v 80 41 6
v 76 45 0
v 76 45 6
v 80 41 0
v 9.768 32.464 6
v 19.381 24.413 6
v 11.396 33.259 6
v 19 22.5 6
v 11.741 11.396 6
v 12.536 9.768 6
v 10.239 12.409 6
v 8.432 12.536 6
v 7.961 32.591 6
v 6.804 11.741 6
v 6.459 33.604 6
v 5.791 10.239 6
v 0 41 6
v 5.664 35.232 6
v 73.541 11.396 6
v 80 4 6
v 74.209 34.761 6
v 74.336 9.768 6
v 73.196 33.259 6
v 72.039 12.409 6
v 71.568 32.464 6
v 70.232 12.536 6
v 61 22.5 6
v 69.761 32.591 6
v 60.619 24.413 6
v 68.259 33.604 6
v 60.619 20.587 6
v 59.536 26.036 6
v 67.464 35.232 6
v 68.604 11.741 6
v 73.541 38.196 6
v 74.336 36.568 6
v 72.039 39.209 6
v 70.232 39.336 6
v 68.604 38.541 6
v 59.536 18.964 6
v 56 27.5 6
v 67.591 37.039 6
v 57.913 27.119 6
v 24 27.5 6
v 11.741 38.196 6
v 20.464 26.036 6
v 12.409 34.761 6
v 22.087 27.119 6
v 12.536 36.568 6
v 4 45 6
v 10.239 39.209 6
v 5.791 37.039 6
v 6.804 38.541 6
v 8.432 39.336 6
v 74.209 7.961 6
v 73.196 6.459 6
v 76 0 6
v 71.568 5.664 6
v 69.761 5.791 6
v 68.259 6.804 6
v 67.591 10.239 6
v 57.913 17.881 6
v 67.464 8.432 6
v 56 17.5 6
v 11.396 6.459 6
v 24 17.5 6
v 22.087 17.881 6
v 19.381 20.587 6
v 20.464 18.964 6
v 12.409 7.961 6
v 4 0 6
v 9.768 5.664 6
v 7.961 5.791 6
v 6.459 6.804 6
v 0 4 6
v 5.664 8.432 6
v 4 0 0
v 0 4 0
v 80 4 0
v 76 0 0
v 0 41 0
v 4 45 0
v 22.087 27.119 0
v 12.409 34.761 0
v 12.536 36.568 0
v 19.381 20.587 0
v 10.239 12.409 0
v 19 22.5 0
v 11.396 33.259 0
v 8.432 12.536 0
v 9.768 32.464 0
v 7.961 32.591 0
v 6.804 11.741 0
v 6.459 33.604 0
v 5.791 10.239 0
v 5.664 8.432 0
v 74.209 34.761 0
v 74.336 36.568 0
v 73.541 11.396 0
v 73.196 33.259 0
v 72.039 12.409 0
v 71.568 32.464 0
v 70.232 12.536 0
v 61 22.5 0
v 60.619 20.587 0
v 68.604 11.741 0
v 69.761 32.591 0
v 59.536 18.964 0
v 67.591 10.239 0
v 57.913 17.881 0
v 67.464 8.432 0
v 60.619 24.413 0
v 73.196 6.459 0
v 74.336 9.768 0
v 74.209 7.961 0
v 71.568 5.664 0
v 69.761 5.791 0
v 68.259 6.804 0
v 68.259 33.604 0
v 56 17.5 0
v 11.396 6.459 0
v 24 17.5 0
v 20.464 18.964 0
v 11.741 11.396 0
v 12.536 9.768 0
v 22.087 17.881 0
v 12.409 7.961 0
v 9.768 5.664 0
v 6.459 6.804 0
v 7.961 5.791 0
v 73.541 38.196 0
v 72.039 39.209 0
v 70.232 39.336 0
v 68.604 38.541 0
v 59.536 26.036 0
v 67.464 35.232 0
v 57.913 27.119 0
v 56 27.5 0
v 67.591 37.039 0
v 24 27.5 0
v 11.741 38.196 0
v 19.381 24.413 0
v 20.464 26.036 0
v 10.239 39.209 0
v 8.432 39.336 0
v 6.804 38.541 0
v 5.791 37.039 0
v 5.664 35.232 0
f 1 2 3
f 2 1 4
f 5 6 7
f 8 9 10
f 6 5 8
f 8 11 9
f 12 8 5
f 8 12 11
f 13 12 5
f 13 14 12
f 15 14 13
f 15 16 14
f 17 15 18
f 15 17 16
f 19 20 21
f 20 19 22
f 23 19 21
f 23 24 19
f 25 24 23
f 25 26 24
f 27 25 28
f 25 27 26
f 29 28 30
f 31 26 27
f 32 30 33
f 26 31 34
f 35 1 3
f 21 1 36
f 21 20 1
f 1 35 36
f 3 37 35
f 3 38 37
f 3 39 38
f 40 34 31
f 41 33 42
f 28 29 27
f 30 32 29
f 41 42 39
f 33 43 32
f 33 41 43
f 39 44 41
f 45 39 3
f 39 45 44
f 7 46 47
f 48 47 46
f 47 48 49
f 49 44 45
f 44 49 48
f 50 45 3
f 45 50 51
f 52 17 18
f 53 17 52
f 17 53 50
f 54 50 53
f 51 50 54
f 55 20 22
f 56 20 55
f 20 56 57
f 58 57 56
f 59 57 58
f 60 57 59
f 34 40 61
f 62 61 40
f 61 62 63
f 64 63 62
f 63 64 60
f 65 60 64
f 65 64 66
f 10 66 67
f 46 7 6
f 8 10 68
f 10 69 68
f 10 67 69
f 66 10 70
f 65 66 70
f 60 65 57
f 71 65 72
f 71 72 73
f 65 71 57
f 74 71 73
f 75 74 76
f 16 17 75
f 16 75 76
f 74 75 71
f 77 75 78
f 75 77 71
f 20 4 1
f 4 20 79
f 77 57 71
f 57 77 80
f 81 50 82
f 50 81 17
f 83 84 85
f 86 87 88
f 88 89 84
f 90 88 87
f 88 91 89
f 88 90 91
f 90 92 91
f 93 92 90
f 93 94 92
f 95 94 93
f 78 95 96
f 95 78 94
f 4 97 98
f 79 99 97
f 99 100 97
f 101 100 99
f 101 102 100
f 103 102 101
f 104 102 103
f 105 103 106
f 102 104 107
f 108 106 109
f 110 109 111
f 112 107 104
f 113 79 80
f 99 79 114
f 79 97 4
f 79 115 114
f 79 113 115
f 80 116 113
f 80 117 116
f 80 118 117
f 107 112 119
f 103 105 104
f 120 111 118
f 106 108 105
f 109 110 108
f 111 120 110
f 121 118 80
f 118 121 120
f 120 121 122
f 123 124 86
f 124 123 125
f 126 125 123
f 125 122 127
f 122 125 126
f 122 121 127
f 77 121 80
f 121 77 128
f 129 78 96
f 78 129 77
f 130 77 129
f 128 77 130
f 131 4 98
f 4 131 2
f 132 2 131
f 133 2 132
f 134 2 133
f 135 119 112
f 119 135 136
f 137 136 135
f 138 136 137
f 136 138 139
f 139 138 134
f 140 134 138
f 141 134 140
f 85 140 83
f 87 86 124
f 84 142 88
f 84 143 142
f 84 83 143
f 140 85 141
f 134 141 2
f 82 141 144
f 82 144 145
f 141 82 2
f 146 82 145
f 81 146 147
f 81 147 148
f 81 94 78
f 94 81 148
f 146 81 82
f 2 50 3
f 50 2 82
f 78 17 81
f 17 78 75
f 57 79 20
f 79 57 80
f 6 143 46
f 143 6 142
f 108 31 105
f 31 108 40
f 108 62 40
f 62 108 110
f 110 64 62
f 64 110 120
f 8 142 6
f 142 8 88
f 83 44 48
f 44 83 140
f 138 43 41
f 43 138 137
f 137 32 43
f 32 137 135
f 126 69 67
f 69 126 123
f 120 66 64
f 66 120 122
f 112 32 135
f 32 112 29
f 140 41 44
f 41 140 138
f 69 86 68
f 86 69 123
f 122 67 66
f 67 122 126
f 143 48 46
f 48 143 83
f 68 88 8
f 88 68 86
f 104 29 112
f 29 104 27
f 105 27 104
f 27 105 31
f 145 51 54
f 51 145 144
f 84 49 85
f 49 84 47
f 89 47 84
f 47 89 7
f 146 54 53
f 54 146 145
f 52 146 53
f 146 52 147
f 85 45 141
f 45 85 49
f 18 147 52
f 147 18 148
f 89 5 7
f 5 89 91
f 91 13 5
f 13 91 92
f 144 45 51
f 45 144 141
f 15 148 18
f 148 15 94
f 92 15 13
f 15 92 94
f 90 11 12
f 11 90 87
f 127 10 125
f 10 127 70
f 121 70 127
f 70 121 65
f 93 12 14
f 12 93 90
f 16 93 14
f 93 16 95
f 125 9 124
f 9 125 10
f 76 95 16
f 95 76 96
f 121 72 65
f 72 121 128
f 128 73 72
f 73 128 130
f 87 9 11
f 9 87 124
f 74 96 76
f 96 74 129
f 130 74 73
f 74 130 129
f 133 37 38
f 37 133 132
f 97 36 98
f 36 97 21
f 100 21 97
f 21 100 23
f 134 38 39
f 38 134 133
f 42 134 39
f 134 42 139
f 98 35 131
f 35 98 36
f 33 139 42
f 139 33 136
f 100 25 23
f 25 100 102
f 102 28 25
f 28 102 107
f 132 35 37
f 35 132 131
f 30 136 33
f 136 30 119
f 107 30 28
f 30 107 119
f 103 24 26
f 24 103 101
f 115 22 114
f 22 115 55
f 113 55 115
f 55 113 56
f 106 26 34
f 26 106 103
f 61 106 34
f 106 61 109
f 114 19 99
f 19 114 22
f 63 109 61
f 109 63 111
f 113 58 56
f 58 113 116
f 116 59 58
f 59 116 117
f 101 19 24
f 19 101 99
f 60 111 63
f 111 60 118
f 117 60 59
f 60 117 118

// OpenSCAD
$fn = 32;

// ----------------------------------------------------------------------
// Bracket plate: slot plate 80 x 45
// ----------------------------------------------------------------------

// --- parameters (mm) ---
hole_r = 3.5;             // bolt hole radius
plate_t = 6;              // plate thickness, Z (extrusion height)
plate_l = 80;             // plate length
plate_w = 45;             // plate width
slot_l = 32;              // slot straight length
slot_r = 5;               // slot end radius

slot_len = slot_l + 2 * slot_r;
slot_w = 2 * slot_r;
hole_d2 = 2 * hole_r;

profile = [[4, 0], [76, 0], [80, 4], [80, 41], [76, 45], [4, 45], [0, 41], [0, 4]];  // primary outline, 8 points, counter clockwise
void_1 = [[56, 17.5], [57.913, 17.881], [59.536, 18.964], [60.619, 20.587], [61, 22.5], [60.619, 24.413], [59.536, 26.036], [57.913, 27.119], [56, 27.5], [24, 27.5], [22.087, 27.119], [20.464, 26.036], [19.381, 24.413], [19, 22.5], [19.381, 20.587], [20.464, 18.964], [22.087, 17.881], [24, 17.5]];  // grip slot, 18 points
void_2 = [[12.536, 36.568], [11.741, 38.196], [10.239, 39.209], [8.432, 39.336], [6.804, 38.541], [5.791, 37.039], [5.664, 35.232], [6.459, 33.604], [7.961, 32.591], [9.768, 32.464], [11.396, 33.259], [12.409, 34.761]];  // corner hole, 12 points
void_3 = [[12.536, 9.768], [11.741, 11.396], [10.239, 12.409], [8.432, 12.536], [6.804, 11.741], [5.791, 10.239], [5.664, 8.432], [6.459, 6.804], [7.961, 5.791], [9.768, 5.664], [11.396, 6.459], [12.409, 7.961]];  // corner hole, 12 points
void_4 = [[74.336, 36.568], [73.541, 38.196], [72.039, 39.209], [70.232, 39.336], [68.604, 38.541], [67.591, 37.039], [67.464, 35.232], [68.259, 33.604], [69.761, 32.591], [71.568, 32.464], [73.196, 33.259], [74.209, 34.761]];  // corner hole, 12 points
void_5 = [[74.336, 9.768], [73.541, 11.396], [72.039, 12.409], [70.232, 12.536], [68.604, 11.741], [67.591, 10.239], [67.464, 8.432], [68.259, 6.804], [69.761, 5.791], [71.568, 5.664], [73.196, 6.459], [74.209, 7.961]];  // corner hole, 12 points

// --- the one profile operation ---
difference() {
  linear_extrude(height = plate_t) polygon(points = profile);
  translate([0, 0, -1])
    linear_extrude(height = plate_t + 2) polygon(points = void_1);
  translate([0, 0, -1])
    linear_extrude(height = plate_t + 2) polygon(points = void_2);
  translate([0, 0, -1])
    linear_extrude(height = plate_t + 2) polygon(points = void_3);
  translate([0, 0, -1])
    linear_extrude(height = plate_t + 2) polygon(points = void_4);
  translate([0, 0, -1])
    linear_extrude(height = plate_t + 2) polygon(points = void_5);
}
